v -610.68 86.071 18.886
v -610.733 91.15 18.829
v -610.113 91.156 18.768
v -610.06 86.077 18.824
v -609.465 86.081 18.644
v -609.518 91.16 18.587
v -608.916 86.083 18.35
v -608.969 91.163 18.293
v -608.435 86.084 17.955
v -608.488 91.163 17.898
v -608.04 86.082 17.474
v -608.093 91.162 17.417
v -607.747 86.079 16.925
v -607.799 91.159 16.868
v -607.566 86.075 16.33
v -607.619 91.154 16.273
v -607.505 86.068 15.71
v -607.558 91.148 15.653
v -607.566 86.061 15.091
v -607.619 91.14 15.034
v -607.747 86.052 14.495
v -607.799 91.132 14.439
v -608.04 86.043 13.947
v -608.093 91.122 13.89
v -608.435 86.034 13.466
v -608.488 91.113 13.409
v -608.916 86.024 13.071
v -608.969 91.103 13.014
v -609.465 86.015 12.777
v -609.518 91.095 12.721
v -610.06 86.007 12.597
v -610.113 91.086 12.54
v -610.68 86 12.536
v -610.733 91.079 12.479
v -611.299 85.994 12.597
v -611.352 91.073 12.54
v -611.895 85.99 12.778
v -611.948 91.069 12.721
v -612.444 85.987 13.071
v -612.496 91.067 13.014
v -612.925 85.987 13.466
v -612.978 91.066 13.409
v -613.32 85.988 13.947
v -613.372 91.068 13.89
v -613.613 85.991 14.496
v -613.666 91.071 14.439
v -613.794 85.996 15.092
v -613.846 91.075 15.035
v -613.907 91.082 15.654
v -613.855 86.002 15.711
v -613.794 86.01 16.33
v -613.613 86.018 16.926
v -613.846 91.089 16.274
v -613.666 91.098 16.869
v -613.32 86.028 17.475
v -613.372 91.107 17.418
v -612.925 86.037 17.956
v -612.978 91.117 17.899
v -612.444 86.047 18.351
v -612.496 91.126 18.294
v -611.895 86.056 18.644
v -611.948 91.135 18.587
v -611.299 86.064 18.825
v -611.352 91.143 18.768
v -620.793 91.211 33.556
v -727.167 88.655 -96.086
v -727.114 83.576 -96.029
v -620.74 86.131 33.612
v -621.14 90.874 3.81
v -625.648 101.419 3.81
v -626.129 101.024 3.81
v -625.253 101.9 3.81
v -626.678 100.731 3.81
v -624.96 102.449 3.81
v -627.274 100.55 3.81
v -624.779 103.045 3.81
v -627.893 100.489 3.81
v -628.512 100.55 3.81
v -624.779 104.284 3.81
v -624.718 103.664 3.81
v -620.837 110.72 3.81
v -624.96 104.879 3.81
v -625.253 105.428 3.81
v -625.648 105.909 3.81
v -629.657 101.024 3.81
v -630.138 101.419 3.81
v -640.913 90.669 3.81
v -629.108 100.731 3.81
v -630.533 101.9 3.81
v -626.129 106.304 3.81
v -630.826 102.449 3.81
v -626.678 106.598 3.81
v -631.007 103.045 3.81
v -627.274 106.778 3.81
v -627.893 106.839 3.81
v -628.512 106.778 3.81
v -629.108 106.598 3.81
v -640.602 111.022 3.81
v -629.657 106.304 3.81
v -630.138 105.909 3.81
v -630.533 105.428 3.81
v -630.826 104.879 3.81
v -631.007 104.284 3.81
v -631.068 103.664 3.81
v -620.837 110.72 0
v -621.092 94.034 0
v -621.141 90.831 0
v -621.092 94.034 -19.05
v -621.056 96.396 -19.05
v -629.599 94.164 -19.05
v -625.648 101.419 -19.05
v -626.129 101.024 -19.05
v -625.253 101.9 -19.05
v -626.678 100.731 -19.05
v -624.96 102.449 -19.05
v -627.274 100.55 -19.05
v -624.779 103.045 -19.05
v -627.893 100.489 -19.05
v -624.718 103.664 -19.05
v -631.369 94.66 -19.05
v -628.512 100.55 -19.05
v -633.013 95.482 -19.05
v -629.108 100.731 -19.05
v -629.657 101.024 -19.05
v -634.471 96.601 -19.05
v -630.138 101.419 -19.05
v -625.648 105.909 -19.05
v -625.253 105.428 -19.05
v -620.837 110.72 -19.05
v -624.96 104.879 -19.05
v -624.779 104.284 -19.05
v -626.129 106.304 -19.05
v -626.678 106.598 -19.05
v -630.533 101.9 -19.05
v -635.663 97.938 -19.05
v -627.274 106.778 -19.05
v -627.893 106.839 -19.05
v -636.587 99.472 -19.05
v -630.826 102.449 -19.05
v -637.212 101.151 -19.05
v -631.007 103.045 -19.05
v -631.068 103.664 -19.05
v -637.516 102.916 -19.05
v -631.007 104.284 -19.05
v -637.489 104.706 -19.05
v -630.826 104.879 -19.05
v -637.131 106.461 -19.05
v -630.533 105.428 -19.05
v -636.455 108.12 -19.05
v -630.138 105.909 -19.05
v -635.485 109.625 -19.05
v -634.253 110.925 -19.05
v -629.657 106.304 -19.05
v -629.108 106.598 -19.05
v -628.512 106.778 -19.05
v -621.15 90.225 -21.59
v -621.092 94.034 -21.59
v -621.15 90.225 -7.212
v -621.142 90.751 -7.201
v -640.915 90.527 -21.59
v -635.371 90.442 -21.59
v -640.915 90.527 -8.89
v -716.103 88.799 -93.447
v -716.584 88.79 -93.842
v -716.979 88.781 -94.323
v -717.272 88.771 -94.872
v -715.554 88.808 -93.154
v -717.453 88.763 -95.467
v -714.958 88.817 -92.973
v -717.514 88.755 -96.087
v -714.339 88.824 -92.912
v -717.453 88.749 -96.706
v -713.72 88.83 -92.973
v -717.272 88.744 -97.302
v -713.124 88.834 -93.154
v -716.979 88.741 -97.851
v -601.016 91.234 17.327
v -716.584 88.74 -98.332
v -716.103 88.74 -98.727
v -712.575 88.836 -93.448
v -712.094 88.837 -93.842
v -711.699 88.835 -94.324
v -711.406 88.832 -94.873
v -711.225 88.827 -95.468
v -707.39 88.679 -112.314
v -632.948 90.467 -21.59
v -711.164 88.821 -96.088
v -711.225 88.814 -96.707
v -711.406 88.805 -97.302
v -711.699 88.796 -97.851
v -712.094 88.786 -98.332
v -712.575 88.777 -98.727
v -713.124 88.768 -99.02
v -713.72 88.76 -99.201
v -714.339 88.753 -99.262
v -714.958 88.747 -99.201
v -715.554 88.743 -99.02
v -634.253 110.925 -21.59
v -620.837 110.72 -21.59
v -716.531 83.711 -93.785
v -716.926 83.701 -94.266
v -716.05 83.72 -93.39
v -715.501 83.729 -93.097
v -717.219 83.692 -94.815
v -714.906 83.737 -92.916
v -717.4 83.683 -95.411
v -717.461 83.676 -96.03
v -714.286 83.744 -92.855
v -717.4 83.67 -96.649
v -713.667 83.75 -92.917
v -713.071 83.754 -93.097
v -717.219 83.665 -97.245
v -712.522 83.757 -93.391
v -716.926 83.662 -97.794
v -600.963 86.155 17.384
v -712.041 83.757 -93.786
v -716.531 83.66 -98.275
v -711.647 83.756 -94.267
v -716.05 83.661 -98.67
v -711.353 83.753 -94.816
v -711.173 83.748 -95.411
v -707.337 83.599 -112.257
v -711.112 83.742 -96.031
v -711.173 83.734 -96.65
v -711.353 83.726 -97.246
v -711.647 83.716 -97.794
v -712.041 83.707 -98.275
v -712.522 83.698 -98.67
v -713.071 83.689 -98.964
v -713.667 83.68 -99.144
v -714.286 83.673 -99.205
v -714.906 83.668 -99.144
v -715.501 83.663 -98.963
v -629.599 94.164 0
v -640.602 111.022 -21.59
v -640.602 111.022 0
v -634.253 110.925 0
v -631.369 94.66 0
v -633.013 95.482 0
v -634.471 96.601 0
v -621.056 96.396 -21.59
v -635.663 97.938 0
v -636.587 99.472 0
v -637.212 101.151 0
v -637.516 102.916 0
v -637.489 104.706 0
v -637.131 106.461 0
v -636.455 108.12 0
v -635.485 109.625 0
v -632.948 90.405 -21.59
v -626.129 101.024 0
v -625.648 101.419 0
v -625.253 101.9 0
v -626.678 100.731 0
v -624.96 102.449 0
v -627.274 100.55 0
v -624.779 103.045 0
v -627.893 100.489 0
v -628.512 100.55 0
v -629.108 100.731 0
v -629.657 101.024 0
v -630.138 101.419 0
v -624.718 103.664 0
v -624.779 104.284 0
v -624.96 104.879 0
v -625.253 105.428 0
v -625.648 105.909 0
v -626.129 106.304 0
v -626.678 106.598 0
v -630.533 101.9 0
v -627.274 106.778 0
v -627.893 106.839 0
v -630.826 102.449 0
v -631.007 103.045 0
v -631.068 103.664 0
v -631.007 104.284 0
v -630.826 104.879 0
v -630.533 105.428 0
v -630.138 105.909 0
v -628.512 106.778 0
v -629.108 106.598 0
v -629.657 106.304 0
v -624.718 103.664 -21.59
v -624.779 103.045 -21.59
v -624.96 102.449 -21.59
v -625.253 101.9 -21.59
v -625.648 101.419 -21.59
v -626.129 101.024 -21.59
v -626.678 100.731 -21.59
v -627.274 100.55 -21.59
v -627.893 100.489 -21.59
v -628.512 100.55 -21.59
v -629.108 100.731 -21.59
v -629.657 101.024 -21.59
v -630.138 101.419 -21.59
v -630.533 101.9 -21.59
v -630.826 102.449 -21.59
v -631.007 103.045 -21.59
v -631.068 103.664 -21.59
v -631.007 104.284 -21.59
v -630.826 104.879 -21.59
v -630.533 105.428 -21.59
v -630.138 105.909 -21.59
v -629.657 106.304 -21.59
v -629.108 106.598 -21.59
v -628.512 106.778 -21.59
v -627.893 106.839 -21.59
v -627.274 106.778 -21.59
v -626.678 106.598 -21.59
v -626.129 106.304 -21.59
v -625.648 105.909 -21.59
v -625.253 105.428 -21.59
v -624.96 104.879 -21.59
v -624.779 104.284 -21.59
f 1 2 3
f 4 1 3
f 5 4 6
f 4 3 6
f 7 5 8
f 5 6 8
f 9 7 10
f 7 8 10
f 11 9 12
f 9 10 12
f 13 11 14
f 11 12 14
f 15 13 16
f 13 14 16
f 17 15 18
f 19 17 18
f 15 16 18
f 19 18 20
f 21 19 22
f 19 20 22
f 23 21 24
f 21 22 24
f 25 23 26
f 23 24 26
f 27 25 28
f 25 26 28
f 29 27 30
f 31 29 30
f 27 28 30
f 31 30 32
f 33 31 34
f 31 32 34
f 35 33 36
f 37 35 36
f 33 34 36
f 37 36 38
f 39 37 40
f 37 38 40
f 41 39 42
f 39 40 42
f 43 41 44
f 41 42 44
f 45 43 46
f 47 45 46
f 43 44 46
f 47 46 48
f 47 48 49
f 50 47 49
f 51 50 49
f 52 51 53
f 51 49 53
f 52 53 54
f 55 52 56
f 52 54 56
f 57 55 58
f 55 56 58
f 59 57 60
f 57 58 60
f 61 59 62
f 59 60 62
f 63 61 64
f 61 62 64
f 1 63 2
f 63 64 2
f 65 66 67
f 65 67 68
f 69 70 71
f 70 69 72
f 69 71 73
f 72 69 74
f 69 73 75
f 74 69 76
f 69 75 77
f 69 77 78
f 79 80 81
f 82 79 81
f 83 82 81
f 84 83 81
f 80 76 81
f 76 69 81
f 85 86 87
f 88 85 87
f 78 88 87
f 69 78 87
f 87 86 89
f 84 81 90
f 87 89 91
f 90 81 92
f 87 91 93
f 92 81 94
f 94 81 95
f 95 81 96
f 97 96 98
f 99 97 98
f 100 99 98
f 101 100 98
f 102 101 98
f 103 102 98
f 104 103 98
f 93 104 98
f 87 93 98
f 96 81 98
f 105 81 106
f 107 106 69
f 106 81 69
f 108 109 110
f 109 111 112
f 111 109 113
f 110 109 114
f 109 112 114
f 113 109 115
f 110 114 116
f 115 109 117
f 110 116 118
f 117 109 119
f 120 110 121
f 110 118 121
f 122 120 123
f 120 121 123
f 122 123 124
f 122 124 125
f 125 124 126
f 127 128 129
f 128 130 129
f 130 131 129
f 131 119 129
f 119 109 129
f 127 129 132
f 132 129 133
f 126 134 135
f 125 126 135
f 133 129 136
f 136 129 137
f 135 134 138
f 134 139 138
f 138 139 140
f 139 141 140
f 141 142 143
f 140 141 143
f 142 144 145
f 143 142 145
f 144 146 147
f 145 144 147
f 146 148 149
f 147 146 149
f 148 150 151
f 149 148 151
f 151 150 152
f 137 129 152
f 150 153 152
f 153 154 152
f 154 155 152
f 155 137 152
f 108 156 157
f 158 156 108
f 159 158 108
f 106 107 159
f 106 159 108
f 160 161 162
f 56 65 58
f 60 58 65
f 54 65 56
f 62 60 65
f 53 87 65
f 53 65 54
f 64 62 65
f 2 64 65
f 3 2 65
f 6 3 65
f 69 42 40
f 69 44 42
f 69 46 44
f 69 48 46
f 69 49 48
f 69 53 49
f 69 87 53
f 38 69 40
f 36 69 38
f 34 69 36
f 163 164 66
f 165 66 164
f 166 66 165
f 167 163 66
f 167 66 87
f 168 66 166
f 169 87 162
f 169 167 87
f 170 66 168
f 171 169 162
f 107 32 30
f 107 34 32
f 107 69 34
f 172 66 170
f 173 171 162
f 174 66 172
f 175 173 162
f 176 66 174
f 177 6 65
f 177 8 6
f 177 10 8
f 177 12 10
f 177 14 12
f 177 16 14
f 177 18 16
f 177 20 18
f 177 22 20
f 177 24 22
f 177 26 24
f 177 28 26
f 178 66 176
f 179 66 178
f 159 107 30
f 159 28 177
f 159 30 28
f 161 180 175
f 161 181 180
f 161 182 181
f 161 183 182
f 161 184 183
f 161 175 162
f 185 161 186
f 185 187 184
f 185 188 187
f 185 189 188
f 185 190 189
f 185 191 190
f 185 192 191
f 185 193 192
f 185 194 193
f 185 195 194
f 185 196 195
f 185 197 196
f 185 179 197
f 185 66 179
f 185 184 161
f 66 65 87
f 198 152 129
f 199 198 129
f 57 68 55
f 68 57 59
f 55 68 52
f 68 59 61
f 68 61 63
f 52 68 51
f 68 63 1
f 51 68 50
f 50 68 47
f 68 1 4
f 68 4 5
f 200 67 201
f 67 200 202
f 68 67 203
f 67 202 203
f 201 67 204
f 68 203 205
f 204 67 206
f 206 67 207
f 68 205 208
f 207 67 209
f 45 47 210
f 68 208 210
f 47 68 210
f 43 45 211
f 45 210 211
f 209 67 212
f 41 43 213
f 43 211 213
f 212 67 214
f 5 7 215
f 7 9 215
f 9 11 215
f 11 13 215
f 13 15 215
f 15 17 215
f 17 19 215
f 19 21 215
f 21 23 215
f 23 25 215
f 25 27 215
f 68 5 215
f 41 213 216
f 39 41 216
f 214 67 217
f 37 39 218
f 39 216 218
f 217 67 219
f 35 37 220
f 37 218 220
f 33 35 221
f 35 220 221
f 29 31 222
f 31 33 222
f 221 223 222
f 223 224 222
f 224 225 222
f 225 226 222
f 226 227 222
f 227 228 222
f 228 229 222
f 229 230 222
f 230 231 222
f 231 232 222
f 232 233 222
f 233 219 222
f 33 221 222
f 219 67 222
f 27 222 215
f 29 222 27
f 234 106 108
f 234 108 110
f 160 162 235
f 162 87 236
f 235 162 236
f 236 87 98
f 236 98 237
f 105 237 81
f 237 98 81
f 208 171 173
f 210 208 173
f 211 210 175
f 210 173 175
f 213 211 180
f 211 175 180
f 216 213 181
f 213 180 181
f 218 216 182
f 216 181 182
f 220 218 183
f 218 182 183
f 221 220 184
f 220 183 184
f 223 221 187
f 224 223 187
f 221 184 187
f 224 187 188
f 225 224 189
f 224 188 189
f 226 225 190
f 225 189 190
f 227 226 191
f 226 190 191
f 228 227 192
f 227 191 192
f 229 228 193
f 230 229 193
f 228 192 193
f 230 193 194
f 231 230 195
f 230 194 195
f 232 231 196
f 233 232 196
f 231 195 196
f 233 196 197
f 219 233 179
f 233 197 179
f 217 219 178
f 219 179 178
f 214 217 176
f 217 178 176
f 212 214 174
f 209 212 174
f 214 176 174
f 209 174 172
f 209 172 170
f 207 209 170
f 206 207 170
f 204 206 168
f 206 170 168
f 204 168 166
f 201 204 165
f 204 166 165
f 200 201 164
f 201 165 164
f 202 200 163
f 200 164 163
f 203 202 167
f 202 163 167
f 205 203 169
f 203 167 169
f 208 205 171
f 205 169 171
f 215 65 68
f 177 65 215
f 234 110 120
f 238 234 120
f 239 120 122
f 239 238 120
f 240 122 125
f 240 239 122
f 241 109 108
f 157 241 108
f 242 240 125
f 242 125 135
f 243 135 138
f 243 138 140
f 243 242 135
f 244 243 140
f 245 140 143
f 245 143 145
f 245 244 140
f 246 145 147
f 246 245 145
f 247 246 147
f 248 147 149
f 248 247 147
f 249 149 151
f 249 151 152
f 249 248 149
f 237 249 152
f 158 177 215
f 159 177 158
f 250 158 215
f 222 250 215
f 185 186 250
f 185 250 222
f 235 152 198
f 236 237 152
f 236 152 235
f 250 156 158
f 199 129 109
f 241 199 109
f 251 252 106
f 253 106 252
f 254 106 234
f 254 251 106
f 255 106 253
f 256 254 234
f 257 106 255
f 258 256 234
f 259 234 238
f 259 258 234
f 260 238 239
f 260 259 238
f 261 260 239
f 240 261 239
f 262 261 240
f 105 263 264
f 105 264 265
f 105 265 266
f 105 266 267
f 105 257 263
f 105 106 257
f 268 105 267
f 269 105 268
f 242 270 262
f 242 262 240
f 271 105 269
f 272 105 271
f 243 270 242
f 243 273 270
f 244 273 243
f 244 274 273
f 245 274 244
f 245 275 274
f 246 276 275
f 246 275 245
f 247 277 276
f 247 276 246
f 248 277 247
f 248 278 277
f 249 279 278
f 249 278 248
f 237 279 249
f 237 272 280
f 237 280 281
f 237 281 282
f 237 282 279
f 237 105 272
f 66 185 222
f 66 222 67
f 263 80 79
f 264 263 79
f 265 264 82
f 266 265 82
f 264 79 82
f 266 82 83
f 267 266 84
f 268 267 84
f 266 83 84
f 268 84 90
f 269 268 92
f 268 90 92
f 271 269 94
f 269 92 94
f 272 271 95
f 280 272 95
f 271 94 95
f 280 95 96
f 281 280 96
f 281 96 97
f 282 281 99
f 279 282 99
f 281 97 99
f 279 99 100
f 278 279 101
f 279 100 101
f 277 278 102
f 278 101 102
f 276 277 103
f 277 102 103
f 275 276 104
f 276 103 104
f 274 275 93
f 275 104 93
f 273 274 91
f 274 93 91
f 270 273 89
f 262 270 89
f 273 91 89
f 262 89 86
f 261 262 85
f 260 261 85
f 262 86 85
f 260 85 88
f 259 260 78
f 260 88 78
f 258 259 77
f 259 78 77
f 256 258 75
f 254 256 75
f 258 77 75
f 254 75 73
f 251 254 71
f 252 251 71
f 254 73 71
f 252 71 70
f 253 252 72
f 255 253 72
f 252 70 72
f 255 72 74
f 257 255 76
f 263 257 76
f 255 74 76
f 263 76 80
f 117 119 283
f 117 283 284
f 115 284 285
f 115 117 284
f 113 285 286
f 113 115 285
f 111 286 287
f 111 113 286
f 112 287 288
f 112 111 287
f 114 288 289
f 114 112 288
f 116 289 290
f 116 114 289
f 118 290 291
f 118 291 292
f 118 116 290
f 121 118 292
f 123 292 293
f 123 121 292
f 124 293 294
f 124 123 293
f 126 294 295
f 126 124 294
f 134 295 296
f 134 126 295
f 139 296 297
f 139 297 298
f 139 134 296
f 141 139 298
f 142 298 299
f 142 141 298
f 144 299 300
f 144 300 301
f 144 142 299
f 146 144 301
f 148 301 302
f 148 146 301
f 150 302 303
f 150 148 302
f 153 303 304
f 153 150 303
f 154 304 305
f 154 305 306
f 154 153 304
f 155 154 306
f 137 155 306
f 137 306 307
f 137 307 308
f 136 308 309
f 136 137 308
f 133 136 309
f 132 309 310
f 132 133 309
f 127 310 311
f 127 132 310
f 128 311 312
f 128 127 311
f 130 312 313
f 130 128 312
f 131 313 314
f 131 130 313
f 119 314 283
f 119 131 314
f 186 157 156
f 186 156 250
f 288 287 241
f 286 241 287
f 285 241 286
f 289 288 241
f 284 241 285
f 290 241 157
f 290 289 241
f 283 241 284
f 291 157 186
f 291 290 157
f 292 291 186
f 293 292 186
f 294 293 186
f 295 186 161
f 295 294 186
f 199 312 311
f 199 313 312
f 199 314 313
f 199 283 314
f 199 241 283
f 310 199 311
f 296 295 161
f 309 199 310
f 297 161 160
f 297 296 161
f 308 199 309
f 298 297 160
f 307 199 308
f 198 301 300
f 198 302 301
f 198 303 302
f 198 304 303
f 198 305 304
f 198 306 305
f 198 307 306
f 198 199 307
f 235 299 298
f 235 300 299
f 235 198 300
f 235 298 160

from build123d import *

# Parameters (mm, degrees)
BOSS_EXTRUDE1_DEPTH = 21.59
SKETCH2_R           = 3.175
BOSS_EXTRUDE3_DEPTH = 2.54
BOSS_EXTRUDE4_START = 3.81
SKETCH3_R           = 3.175
BOSS_EXTRUDE4_DEPTH = 3.81
SKETCH4_R           = 3.175
BOSS_EXTRUDE5_DEPTH = 5.08


with BuildPart() as part:
    # Sketch1 → Boss-Extrude1 (new body)
    with BuildSketch(Plane.XY):
        with BuildLine():
            Line((-621.150306902, 90.224895892), (-621.092144063, 94.034451914))
            Line((-621.092144063, 94.034451914), (-629.598897849, 94.164329766))
            ThreePointArc((-629.598897849, 94.164329766), (-632.210560309, 95.031876848), (-634.47123768, 96.601194079))
            ThreePointArc((-634.47123768, 96.601194079), (-637.543945735, 103.811741783), (-634.252545404, 110.925124722))
            Line((-634.252545404, 110.925124722), (-640.60180544, 111.022062787))
            Line((-640.60180544, 111.022062787), (-640.914721516, 90.52665139))
            Line((-640.914721516, 90.52665139), (-621.150306902, 90.224895892))
        make_face()
    extrude(amount=-BOSS_EXTRUDE1_DEPTH)

    # Sketch2 → Boss-Extrude3 (add)
    # profile 1 of 2: a face of its own
    with BuildSketch(Plane(origin=(0, 0, -19.05), x_dir=(-1, 0, 0), z_dir=(0, 0, -1))):
        with BuildLine():
            Line((620.837390826, 110.72030729), (621.056083102, 96.396376647))
            Line((621.056083102, 96.396376647), (634.47123768, 96.601194079))
            ThreePointArc((634.47123768, 96.601194079), (637.543945735, 103.811741783), (634.252545404, 110.925124722))
            Line((634.252545404, 110.925124722), (620.837390826, 110.72030729))
        make_face()
        with Locations(Location((627.893070479, 103.664395923, 0), (0, 0, 180))):
            Circle(SKETCH2_R, mode=Mode.SUBTRACT)
    # profile 2 of 2: a face of its own
    with BuildSketch(Plane(origin=(0, 0, -19.05), x_dir=(-1, 0, 0), z_dir=(0, 0, -1))):
        with BuildLine():
            Line((621.056083102, 96.396376647), (621.092144063, 94.034451914))
            Line((621.092144063, 94.034451914), (629.598897849, 94.164329766))
            ThreePointArc((629.598897849, 94.164329766), (632.210560309, 95.031876848), (634.47123768, 96.601194079))
            Line((634.47123768, 96.601194079), (621.056083102, 96.396376647))
        make_face()
    extrude(amount=BOSS_EXTRUDE3_DEPTH)

    # Sketch3 → Boss-Extrude4 (add)
    with BuildSketch(Plane.XY.offset(BOSS_EXTRUDE4_START)):
        Polygon((-640.60180544, 111.022062787), (-620.837390826, 110.72030729), (-621.150306902, 90.224895892), (-640.914721516, 90.52665139), align=None)
        with Locations((-627.893070479, 103.664395923)):
            Circle(SKETCH3_R, mode=Mode.SUBTRACT)
    extrude(amount=-BOSS_EXTRUDE4_DEPTH)

    # Sketch4 → Boss-Extrude5 (add)
    with BuildSketch(Plane(origin=(-1.009584834, 97.256608571, -1.08885119), x_dir=(0.9999461323694532, 0.010378769561310733, -0.00011619709707159695), z_dir=(-0.010379419992088095, 0.9998834703189057, -0.011194347843893974))):
        Polygon((-726.19647196, 95.087156462), (-619.816577451, -34.574539021), (-600.038415617, -18.347705324), (-706.418310126, 111.313990158), align=None)
        with Locations(Location((-713.367901644, 95.087156462, 0), (0, 0, 270))):
            Circle(SKETCH4_R, mode=Mode.SUBTRACT)
        with Locations(Location((-609.755864614, -16.672880145, 0), (0, 0, 270))):
            Circle(SKETCH4_R, mode=Mode.SUBTRACT)
    extrude(amount=-BOSS_EXTRUDE5_DEPTH)


solid = part.part
